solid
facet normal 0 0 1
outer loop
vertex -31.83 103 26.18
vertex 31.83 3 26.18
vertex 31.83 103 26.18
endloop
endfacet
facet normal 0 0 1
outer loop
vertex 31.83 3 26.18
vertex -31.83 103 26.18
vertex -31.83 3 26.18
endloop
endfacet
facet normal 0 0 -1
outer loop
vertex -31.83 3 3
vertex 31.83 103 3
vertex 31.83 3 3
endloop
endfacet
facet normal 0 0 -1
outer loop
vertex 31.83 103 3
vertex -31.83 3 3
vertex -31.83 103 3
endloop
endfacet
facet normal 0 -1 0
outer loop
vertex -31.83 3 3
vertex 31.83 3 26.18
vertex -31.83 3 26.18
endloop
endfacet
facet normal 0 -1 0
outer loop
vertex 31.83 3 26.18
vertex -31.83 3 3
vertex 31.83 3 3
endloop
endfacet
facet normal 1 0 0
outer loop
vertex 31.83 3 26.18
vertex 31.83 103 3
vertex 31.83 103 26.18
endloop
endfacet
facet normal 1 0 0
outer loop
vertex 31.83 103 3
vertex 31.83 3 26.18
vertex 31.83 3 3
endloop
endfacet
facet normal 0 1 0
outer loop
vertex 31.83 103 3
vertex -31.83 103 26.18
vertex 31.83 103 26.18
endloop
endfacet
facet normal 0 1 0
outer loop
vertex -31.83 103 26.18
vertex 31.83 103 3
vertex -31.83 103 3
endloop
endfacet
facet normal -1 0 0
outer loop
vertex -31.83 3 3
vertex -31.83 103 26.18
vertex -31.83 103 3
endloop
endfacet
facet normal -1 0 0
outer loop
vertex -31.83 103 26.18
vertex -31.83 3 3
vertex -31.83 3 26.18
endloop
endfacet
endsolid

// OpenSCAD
/*
Open-top U-cradle under-desk mount for a rectangular power brick
- Cradle has only 3 walls: bottom + two sides (TOP IS OPEN)
- Flanges are on top of the side walls and contain screw slots (2 per side)
- Optional device visualization as a rectangular prism you can toggle on/off

Copy/paste into OpenSCAD.
Render: F6
Export STL: File -> Export -> Export as STL

Axes:
- X = width (left/right)
- Y = length (front/back)
- Z = height (up toward desk)
*/

//////////////////////
// TOGGLES
//////////////////////
show_device = true;        // set false to hide device preview
show_mount  = true;        // set false to show only the device
device_alpha = 0.35;       // transparency for device preview (0..1)

$fn = 48;                  // global circle resolution

//////////////////////
// DEVICE DIMENSIONS (mm)
//////////////////////
device_w = 63.66;
device_h = 23.18;
device_l = 100;

//////////////////////
// FIT / STRENGTH (mm)
//////////////////////
clearance_xy = 0.8;        // left/right clearance
clearance_z  = 0.8;        // height clearance (device to cradle)

wall_t = 3.0;              // side wall thickness
base_t = 3.0;              // bottom thickness under device

fillet_r = 2.5;            // rounds outside edges of the profile (approx fillet)
mount_l = device_l + 6;    // overall mount length (extra so it doesn't bind)

//////////////////////
// FLANGES (MOUNTING) (mm)
//////////////////////
flange_w = 14.0;           // outward extension from side wall
flange_t = 5.0;            // vertical thickness of flange (Z thickness)

//////////////////////
// SCREW SLOTS (mm)
//////////////////////
slot_d = 4.8;              // slot width / hole diameter clearance
slot_len = 10.0;           // elongation along Y for adjustability
slot_edge_inset = 8.0;     // distance from each end to slot center (along Y)

//////////////////////
// OPTIONAL: DEVICE VISUAL OFFSET
//////////////////////
// If you want the device centered differently along length, adjust this.
// 0 centers device within mount length.
device_y_offset = 0;

//////////////////////
// DERIVED VALUES
//////////////////////
inner_w = device_w + 2*clearance_xy;
inner_h = device_h + clearance_z;

outer_w = inner_w + 2*wall_t;

// Side wall height = bottom thickness + inner cavity height (top remains open)
side_wall_h = base_t + inner_h;

// Convenience
half_outer = outer_w/2;

// Slot X positions: center of each flange region
slot_x_left  = -(half_outer + flange_w/2);
slot_x_right =  (half_outer + flange_w/2);

// Slot Y positions: front/back
slot_y_front = slot_edge_inset;
slot_y_back  = mount_l - slot_edge_inset;

//////////////////////
// HELPERS
//////////////////////

// 2D capsule used for slots (in XY, then extruded in Z)
module slot2d(slot_length, hole_d) {
  hull() {
    translate([-slot_length/2, 0]) circle(d=hole_d);
    translate([ slot_length/2, 0]) circle(d=hole_d);
  }
}

// 2D profile (X,Z) for an open-top U cradle + flanges
module open_u_profile_2d() {
  // Build from rectangles then round outer edges via offset.
  // offset(+r) then offset(-r) yields rounded exterior corners.
  offset(r=fillet_r, $fn=24)
    offset(delta=-fillet_r, $fn=24)
      union() {
        // Bottom plate
        translate([-half_outer, 0])
          square([outer_w, base_t]);

        // Left side wall
        translate([-half_outer, 0])
          square([wall_t, side_wall_h]);

        // Right side wall
        translate([half_outer - wall_t, 0])
          square([wall_t, side_wall_h]);

        // Left flange: sits atop side wall, extends outward + covers wall thickness
        translate([-half_outer - flange_w, side_wall_h])
          square([flange_w + wall_t, flange_t]);

        // Right flange
        translate([half_outer - wall_t, side_wall_h])
          square([flange_w + wall_t, flange_t]);
      }
}

//////////////////////
// MAIN MOUNT SOLID
//////////////////////
module mount_solid() {
  eps = 0.01; // small value to ensure clean boolean operations
  
  difference() {
    // Extrude the outer shell profile along Y
    linear_extrude(height=mount_l, center=false, convexity=10)
      open_u_profile_2d();

    // Cut inner cavity for device (OPEN TO THE TOP)
    // Removes interior space only up to the top of the side walls.
    translate([-inner_w/2, -eps, base_t])
      cube([inner_w, mount_l + 2*eps, inner_h + eps]);

    // Cut 4 vertical screw slots through flange thickness
    for (sx = [slot_x_left, slot_x_right]) {
      for (sy = [slot_y_front, slot_y_back]) {
        translate([sx, sy, side_wall_h - eps]) // bottom of flange region
          linear_extrude(height=flange_t + 2*eps, center=false, convexity=5)
            slot2d(slot_len, slot_d);
      }
    }
  }
}

//////////////////////
// DEVICE PREVIEW
//////////////////////
module device_preview() {
  // Place device so it rests on the bottom plate (z = base_t)
  // and is centered left/right. Center along Y within mount length.
  dev_y = (mount_l - device_l)/2 + device_y_offset;

  color([0.1, 0.7, 0.2, device_alpha])
    translate([-device_w/2, dev_y, base_t])
      cube([device_w, device_l, device_h], center=false);
}

//////////////////////
// SCENE
//////////////////////
if (show_mount) {
  color([0.2, 0.2, 0.2, 1.0]) mount_solid();
}

if (show_device) {
  device_preview();
}
